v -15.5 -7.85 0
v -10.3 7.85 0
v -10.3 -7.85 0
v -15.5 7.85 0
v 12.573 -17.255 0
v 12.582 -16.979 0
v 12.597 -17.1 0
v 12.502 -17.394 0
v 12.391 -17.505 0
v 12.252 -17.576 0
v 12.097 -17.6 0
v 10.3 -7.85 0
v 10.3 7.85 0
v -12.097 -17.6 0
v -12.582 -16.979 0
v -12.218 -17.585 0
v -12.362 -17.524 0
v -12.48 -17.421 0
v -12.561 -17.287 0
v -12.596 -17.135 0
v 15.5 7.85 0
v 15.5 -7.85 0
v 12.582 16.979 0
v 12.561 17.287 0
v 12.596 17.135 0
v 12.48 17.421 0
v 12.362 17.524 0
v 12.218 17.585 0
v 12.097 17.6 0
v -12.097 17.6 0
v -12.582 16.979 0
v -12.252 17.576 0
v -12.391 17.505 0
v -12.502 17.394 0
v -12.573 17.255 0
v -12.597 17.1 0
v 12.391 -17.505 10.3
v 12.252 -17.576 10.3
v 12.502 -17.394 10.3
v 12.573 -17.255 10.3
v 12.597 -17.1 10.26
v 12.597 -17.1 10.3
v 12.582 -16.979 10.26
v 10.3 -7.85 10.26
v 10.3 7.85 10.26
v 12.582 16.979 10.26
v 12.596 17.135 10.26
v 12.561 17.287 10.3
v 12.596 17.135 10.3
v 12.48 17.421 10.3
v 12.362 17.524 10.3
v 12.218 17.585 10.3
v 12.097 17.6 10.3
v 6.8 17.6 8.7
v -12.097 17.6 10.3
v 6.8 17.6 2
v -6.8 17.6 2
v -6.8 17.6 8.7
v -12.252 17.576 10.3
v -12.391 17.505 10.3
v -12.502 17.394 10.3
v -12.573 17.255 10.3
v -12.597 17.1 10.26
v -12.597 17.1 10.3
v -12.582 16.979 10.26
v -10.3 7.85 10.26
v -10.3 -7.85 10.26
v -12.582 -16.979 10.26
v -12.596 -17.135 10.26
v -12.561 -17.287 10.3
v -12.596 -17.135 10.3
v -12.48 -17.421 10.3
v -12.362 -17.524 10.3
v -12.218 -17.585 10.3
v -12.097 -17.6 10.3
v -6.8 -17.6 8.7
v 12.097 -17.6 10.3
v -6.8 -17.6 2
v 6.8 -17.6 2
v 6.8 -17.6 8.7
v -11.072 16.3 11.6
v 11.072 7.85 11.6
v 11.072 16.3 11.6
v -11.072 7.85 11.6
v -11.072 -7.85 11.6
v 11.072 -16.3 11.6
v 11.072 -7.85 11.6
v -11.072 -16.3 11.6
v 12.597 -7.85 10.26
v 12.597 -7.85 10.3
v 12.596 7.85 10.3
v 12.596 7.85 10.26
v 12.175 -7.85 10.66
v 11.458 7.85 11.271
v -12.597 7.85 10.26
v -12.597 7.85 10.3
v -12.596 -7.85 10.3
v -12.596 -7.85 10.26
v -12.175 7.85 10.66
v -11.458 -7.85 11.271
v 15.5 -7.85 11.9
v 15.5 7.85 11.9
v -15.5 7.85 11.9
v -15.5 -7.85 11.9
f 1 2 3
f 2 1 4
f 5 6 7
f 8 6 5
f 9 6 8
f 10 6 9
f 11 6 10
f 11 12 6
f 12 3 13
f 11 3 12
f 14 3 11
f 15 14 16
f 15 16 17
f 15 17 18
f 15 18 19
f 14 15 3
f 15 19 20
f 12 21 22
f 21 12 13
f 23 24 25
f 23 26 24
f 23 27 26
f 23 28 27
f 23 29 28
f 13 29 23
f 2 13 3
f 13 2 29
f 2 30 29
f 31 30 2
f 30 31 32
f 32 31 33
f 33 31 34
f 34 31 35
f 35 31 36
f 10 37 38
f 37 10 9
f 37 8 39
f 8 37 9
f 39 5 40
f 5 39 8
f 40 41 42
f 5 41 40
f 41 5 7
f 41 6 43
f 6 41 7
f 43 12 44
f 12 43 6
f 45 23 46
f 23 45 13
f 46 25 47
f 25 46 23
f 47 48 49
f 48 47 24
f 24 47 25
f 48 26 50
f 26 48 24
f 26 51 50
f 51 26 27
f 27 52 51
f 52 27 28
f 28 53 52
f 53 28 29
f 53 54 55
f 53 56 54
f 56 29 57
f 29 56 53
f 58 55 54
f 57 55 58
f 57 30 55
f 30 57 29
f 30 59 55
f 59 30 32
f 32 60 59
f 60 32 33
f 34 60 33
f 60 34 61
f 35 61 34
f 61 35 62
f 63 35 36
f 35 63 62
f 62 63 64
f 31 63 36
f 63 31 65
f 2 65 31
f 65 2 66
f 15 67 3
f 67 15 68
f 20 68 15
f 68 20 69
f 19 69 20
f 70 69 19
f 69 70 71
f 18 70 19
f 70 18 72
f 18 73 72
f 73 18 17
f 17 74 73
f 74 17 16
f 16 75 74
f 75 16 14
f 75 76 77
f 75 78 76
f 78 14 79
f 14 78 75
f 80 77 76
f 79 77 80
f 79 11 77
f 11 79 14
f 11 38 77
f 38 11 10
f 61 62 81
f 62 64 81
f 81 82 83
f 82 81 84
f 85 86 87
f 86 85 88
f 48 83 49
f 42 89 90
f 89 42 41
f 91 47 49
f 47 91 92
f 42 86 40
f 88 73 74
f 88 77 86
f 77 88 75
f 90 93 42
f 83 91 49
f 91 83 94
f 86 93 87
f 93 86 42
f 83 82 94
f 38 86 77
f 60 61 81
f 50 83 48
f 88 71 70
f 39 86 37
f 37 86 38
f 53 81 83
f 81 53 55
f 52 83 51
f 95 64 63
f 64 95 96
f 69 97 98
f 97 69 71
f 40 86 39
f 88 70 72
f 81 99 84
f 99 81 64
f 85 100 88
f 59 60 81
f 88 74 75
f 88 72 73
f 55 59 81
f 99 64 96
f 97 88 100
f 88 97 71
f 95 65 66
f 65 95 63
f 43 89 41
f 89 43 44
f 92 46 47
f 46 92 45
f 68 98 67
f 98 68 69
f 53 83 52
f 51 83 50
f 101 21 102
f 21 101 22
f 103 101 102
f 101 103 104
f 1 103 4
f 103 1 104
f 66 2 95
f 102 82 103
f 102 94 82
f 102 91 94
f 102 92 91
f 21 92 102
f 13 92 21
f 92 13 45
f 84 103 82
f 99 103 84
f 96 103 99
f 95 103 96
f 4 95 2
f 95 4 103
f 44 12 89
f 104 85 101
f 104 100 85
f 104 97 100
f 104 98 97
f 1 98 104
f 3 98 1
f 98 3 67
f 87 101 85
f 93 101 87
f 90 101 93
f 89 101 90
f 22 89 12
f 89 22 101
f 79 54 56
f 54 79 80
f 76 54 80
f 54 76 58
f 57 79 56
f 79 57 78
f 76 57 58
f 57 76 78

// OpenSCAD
// file: connector_key_vertical.scad
// Universal Rear-Entry Interlocking Hollow Double-Dovetail ("Bowtie") Conduit Key
// Inserts straight into the flat BACK face of two mating letters (+Y -> -Y) where there is zero front-bezel overhang!
//   - Prints flat on its smooth 2.00 mm rear cap face (Z = 0 on build plate) with ZERO supports; continuous axial
//     perimeter loops carry >25 kg tensile load.
//   - Leading top edge (Z = 10.30 -> 11.60 mm) has a matching 1.30 mm x 45 deg chamfer that seats squarely against
//     the base socket's internal 45 deg positive depth-stop bevel so the back of the key sits dead-flush at Y = +12.40 mm!
//   - Center 13.60 mm channel fits a 10 mm or 12 mm WS2812B LED strip (or 3-pin JST-SM plug) right inside it.

dovetail_clearance = 0.20;        // Per-side XY clearance against female base mortise (mm)
end_clearance      = 0.25;        // Tip clearance so mating letter housings pull 100% tight face-to-face (mm)
bridge_gap         = 12.70;       // Letter-to-letter seam gap (mm): key spans the gap + 9.75 mm into each letter (length = gap + 19.5 mm)
straddle_open      = true;        // true = open inward U-channel (drop LED strip in, press key over it); false = closed tunnel

mortise_waist_w    = 21.00;
mortise_head_w     = 26.00;
mortise_depth      = 10.00;
key_body_h         = 10.30;       // Full-width dovetail height (seats into 10.50 mm straight rear mortise)
lead_chamfer       = 1.30;        // 45 deg leading-edge chamfer matching base's internal depth-stop seat (total Z = 11.60 mm)
bore_w             = 13.60;       // Clear internal width for 10 mm / 12 mm LED strip or JST-SM plug (mm)
rear_cap_t         = 2.00;        // Solid flush outer back cap (seals the rear seam opaque black at Y = +10.40 .. +12.40 mm!)
inner_web_t        = 1.60;        // Used only when straddle_open = false (leaves 6.70 mm x 13.60 mm enclosed box tunnel)
collar_w           = 31.00;       // Outer width of center bridge collar when bridge_gap > 0
collar_thick_y     = 11.90;       // Spans Y = +0.50 .. +12.40 mm when bridge_gap > 0

module bowtie_2d(gap, L, w0, w1, inset = 0) {
    half_g = gap / 2;
    offset(delta = -inset)
        offset(r = 0.5, $fn = 20) offset(delta = -0.5)
            polygon([
                [-w0, -half_g],
                [-w1, -(half_g + L)],
                [ w1, -(half_g + L)],
                [ w0, -half_g],
                [ w0,  half_g],
                [ w1,  half_g + L],
                [-w1,  half_g + L],
                [-w0,  half_g]
            ]);
}

module bowtie_key(gap = bridge_gap, straddle = straddle_open, clr = dovetail_clearance) {
    L = mortise_depth - end_clearance; // 9.75 mm insertion per side
    slope = ((mortise_head_w - mortise_waist_w) / 2) / mortise_depth; // 0.25 (14.04 deg)
    w0 = mortise_waist_w / 2 - clr;    // 10.30 mm
    w1 = w0 + slope * L;               // 12.74 mm
    half_g = gap / 2;
    total_len = 2 * (half_g + L);
    total_z = key_body_h + lead_chamfer; // 11.60 mm

    difference() {
        union() {
            // Straight rear-entry dovetail body (Z = 0 .. 10.30 mm) + 45 deg leading seat chamfer (Z = 10.30 .. 11.60 mm)
            linear_extrude(height = key_body_h)
                bowtie_2d(gap, L, w0, w1, 0);
            hull() {
                translate([0, 0, key_body_h - 0.04])
                    linear_extrude(height = 0.04) bowtie_2d(gap, L, w0, w1, 0);
                translate([0, 0, total_z - 0.04])
                    linear_extrude(height = 0.04) bowtie_2d(gap, L, w0, w1, lead_chamfer);
            }

            // Enclosed black spacer collar across non-zero bridge gaps (FL/FR side bridges)
            if (gap > 0.01)
                translate([-collar_w / 2, -half_g, 0])
                    cube([collar_w, gap, collar_thick_y]);
        }

        // Center 13.60 mm LED-strip channel: open U (straddle) across the full key length, gap included
        if (straddle) {
            // Open U-channel facing INWARD (-Y inside the lamp), solid 2.00 mm rear cap flush on the outside back!
            translate([-bore_w / 2, -total_len / 2 - 1, rear_cap_t])
                cube([bore_w, total_len + 2, total_z + 2]);
        } else {
            // Closed rectangular box tunnel (13.60 x 6.70 mm) enclosed front & back
            translate([-bore_w / 2, -total_len / 2 - 1, rear_cap_t])
                cube([bore_w, total_len + 2, key_body_h - rear_cap_t - inner_web_t]);
        }
    }
}

bowtie_key();
// main file
// Enclosed Hollow Double-Dovetail Flame Bridge Key (15.70 mm bridge span — print 2x for FL <-> E_top and E_top <-> FR)
// Locks the Left & Right Flames into the top "E" with an enclosed light-tight black LED-strip conduit across the 15.70 mm gap.

use <connector_key_vertical.scad>

bowtie_key(gap = 15.70, straddle = false);
